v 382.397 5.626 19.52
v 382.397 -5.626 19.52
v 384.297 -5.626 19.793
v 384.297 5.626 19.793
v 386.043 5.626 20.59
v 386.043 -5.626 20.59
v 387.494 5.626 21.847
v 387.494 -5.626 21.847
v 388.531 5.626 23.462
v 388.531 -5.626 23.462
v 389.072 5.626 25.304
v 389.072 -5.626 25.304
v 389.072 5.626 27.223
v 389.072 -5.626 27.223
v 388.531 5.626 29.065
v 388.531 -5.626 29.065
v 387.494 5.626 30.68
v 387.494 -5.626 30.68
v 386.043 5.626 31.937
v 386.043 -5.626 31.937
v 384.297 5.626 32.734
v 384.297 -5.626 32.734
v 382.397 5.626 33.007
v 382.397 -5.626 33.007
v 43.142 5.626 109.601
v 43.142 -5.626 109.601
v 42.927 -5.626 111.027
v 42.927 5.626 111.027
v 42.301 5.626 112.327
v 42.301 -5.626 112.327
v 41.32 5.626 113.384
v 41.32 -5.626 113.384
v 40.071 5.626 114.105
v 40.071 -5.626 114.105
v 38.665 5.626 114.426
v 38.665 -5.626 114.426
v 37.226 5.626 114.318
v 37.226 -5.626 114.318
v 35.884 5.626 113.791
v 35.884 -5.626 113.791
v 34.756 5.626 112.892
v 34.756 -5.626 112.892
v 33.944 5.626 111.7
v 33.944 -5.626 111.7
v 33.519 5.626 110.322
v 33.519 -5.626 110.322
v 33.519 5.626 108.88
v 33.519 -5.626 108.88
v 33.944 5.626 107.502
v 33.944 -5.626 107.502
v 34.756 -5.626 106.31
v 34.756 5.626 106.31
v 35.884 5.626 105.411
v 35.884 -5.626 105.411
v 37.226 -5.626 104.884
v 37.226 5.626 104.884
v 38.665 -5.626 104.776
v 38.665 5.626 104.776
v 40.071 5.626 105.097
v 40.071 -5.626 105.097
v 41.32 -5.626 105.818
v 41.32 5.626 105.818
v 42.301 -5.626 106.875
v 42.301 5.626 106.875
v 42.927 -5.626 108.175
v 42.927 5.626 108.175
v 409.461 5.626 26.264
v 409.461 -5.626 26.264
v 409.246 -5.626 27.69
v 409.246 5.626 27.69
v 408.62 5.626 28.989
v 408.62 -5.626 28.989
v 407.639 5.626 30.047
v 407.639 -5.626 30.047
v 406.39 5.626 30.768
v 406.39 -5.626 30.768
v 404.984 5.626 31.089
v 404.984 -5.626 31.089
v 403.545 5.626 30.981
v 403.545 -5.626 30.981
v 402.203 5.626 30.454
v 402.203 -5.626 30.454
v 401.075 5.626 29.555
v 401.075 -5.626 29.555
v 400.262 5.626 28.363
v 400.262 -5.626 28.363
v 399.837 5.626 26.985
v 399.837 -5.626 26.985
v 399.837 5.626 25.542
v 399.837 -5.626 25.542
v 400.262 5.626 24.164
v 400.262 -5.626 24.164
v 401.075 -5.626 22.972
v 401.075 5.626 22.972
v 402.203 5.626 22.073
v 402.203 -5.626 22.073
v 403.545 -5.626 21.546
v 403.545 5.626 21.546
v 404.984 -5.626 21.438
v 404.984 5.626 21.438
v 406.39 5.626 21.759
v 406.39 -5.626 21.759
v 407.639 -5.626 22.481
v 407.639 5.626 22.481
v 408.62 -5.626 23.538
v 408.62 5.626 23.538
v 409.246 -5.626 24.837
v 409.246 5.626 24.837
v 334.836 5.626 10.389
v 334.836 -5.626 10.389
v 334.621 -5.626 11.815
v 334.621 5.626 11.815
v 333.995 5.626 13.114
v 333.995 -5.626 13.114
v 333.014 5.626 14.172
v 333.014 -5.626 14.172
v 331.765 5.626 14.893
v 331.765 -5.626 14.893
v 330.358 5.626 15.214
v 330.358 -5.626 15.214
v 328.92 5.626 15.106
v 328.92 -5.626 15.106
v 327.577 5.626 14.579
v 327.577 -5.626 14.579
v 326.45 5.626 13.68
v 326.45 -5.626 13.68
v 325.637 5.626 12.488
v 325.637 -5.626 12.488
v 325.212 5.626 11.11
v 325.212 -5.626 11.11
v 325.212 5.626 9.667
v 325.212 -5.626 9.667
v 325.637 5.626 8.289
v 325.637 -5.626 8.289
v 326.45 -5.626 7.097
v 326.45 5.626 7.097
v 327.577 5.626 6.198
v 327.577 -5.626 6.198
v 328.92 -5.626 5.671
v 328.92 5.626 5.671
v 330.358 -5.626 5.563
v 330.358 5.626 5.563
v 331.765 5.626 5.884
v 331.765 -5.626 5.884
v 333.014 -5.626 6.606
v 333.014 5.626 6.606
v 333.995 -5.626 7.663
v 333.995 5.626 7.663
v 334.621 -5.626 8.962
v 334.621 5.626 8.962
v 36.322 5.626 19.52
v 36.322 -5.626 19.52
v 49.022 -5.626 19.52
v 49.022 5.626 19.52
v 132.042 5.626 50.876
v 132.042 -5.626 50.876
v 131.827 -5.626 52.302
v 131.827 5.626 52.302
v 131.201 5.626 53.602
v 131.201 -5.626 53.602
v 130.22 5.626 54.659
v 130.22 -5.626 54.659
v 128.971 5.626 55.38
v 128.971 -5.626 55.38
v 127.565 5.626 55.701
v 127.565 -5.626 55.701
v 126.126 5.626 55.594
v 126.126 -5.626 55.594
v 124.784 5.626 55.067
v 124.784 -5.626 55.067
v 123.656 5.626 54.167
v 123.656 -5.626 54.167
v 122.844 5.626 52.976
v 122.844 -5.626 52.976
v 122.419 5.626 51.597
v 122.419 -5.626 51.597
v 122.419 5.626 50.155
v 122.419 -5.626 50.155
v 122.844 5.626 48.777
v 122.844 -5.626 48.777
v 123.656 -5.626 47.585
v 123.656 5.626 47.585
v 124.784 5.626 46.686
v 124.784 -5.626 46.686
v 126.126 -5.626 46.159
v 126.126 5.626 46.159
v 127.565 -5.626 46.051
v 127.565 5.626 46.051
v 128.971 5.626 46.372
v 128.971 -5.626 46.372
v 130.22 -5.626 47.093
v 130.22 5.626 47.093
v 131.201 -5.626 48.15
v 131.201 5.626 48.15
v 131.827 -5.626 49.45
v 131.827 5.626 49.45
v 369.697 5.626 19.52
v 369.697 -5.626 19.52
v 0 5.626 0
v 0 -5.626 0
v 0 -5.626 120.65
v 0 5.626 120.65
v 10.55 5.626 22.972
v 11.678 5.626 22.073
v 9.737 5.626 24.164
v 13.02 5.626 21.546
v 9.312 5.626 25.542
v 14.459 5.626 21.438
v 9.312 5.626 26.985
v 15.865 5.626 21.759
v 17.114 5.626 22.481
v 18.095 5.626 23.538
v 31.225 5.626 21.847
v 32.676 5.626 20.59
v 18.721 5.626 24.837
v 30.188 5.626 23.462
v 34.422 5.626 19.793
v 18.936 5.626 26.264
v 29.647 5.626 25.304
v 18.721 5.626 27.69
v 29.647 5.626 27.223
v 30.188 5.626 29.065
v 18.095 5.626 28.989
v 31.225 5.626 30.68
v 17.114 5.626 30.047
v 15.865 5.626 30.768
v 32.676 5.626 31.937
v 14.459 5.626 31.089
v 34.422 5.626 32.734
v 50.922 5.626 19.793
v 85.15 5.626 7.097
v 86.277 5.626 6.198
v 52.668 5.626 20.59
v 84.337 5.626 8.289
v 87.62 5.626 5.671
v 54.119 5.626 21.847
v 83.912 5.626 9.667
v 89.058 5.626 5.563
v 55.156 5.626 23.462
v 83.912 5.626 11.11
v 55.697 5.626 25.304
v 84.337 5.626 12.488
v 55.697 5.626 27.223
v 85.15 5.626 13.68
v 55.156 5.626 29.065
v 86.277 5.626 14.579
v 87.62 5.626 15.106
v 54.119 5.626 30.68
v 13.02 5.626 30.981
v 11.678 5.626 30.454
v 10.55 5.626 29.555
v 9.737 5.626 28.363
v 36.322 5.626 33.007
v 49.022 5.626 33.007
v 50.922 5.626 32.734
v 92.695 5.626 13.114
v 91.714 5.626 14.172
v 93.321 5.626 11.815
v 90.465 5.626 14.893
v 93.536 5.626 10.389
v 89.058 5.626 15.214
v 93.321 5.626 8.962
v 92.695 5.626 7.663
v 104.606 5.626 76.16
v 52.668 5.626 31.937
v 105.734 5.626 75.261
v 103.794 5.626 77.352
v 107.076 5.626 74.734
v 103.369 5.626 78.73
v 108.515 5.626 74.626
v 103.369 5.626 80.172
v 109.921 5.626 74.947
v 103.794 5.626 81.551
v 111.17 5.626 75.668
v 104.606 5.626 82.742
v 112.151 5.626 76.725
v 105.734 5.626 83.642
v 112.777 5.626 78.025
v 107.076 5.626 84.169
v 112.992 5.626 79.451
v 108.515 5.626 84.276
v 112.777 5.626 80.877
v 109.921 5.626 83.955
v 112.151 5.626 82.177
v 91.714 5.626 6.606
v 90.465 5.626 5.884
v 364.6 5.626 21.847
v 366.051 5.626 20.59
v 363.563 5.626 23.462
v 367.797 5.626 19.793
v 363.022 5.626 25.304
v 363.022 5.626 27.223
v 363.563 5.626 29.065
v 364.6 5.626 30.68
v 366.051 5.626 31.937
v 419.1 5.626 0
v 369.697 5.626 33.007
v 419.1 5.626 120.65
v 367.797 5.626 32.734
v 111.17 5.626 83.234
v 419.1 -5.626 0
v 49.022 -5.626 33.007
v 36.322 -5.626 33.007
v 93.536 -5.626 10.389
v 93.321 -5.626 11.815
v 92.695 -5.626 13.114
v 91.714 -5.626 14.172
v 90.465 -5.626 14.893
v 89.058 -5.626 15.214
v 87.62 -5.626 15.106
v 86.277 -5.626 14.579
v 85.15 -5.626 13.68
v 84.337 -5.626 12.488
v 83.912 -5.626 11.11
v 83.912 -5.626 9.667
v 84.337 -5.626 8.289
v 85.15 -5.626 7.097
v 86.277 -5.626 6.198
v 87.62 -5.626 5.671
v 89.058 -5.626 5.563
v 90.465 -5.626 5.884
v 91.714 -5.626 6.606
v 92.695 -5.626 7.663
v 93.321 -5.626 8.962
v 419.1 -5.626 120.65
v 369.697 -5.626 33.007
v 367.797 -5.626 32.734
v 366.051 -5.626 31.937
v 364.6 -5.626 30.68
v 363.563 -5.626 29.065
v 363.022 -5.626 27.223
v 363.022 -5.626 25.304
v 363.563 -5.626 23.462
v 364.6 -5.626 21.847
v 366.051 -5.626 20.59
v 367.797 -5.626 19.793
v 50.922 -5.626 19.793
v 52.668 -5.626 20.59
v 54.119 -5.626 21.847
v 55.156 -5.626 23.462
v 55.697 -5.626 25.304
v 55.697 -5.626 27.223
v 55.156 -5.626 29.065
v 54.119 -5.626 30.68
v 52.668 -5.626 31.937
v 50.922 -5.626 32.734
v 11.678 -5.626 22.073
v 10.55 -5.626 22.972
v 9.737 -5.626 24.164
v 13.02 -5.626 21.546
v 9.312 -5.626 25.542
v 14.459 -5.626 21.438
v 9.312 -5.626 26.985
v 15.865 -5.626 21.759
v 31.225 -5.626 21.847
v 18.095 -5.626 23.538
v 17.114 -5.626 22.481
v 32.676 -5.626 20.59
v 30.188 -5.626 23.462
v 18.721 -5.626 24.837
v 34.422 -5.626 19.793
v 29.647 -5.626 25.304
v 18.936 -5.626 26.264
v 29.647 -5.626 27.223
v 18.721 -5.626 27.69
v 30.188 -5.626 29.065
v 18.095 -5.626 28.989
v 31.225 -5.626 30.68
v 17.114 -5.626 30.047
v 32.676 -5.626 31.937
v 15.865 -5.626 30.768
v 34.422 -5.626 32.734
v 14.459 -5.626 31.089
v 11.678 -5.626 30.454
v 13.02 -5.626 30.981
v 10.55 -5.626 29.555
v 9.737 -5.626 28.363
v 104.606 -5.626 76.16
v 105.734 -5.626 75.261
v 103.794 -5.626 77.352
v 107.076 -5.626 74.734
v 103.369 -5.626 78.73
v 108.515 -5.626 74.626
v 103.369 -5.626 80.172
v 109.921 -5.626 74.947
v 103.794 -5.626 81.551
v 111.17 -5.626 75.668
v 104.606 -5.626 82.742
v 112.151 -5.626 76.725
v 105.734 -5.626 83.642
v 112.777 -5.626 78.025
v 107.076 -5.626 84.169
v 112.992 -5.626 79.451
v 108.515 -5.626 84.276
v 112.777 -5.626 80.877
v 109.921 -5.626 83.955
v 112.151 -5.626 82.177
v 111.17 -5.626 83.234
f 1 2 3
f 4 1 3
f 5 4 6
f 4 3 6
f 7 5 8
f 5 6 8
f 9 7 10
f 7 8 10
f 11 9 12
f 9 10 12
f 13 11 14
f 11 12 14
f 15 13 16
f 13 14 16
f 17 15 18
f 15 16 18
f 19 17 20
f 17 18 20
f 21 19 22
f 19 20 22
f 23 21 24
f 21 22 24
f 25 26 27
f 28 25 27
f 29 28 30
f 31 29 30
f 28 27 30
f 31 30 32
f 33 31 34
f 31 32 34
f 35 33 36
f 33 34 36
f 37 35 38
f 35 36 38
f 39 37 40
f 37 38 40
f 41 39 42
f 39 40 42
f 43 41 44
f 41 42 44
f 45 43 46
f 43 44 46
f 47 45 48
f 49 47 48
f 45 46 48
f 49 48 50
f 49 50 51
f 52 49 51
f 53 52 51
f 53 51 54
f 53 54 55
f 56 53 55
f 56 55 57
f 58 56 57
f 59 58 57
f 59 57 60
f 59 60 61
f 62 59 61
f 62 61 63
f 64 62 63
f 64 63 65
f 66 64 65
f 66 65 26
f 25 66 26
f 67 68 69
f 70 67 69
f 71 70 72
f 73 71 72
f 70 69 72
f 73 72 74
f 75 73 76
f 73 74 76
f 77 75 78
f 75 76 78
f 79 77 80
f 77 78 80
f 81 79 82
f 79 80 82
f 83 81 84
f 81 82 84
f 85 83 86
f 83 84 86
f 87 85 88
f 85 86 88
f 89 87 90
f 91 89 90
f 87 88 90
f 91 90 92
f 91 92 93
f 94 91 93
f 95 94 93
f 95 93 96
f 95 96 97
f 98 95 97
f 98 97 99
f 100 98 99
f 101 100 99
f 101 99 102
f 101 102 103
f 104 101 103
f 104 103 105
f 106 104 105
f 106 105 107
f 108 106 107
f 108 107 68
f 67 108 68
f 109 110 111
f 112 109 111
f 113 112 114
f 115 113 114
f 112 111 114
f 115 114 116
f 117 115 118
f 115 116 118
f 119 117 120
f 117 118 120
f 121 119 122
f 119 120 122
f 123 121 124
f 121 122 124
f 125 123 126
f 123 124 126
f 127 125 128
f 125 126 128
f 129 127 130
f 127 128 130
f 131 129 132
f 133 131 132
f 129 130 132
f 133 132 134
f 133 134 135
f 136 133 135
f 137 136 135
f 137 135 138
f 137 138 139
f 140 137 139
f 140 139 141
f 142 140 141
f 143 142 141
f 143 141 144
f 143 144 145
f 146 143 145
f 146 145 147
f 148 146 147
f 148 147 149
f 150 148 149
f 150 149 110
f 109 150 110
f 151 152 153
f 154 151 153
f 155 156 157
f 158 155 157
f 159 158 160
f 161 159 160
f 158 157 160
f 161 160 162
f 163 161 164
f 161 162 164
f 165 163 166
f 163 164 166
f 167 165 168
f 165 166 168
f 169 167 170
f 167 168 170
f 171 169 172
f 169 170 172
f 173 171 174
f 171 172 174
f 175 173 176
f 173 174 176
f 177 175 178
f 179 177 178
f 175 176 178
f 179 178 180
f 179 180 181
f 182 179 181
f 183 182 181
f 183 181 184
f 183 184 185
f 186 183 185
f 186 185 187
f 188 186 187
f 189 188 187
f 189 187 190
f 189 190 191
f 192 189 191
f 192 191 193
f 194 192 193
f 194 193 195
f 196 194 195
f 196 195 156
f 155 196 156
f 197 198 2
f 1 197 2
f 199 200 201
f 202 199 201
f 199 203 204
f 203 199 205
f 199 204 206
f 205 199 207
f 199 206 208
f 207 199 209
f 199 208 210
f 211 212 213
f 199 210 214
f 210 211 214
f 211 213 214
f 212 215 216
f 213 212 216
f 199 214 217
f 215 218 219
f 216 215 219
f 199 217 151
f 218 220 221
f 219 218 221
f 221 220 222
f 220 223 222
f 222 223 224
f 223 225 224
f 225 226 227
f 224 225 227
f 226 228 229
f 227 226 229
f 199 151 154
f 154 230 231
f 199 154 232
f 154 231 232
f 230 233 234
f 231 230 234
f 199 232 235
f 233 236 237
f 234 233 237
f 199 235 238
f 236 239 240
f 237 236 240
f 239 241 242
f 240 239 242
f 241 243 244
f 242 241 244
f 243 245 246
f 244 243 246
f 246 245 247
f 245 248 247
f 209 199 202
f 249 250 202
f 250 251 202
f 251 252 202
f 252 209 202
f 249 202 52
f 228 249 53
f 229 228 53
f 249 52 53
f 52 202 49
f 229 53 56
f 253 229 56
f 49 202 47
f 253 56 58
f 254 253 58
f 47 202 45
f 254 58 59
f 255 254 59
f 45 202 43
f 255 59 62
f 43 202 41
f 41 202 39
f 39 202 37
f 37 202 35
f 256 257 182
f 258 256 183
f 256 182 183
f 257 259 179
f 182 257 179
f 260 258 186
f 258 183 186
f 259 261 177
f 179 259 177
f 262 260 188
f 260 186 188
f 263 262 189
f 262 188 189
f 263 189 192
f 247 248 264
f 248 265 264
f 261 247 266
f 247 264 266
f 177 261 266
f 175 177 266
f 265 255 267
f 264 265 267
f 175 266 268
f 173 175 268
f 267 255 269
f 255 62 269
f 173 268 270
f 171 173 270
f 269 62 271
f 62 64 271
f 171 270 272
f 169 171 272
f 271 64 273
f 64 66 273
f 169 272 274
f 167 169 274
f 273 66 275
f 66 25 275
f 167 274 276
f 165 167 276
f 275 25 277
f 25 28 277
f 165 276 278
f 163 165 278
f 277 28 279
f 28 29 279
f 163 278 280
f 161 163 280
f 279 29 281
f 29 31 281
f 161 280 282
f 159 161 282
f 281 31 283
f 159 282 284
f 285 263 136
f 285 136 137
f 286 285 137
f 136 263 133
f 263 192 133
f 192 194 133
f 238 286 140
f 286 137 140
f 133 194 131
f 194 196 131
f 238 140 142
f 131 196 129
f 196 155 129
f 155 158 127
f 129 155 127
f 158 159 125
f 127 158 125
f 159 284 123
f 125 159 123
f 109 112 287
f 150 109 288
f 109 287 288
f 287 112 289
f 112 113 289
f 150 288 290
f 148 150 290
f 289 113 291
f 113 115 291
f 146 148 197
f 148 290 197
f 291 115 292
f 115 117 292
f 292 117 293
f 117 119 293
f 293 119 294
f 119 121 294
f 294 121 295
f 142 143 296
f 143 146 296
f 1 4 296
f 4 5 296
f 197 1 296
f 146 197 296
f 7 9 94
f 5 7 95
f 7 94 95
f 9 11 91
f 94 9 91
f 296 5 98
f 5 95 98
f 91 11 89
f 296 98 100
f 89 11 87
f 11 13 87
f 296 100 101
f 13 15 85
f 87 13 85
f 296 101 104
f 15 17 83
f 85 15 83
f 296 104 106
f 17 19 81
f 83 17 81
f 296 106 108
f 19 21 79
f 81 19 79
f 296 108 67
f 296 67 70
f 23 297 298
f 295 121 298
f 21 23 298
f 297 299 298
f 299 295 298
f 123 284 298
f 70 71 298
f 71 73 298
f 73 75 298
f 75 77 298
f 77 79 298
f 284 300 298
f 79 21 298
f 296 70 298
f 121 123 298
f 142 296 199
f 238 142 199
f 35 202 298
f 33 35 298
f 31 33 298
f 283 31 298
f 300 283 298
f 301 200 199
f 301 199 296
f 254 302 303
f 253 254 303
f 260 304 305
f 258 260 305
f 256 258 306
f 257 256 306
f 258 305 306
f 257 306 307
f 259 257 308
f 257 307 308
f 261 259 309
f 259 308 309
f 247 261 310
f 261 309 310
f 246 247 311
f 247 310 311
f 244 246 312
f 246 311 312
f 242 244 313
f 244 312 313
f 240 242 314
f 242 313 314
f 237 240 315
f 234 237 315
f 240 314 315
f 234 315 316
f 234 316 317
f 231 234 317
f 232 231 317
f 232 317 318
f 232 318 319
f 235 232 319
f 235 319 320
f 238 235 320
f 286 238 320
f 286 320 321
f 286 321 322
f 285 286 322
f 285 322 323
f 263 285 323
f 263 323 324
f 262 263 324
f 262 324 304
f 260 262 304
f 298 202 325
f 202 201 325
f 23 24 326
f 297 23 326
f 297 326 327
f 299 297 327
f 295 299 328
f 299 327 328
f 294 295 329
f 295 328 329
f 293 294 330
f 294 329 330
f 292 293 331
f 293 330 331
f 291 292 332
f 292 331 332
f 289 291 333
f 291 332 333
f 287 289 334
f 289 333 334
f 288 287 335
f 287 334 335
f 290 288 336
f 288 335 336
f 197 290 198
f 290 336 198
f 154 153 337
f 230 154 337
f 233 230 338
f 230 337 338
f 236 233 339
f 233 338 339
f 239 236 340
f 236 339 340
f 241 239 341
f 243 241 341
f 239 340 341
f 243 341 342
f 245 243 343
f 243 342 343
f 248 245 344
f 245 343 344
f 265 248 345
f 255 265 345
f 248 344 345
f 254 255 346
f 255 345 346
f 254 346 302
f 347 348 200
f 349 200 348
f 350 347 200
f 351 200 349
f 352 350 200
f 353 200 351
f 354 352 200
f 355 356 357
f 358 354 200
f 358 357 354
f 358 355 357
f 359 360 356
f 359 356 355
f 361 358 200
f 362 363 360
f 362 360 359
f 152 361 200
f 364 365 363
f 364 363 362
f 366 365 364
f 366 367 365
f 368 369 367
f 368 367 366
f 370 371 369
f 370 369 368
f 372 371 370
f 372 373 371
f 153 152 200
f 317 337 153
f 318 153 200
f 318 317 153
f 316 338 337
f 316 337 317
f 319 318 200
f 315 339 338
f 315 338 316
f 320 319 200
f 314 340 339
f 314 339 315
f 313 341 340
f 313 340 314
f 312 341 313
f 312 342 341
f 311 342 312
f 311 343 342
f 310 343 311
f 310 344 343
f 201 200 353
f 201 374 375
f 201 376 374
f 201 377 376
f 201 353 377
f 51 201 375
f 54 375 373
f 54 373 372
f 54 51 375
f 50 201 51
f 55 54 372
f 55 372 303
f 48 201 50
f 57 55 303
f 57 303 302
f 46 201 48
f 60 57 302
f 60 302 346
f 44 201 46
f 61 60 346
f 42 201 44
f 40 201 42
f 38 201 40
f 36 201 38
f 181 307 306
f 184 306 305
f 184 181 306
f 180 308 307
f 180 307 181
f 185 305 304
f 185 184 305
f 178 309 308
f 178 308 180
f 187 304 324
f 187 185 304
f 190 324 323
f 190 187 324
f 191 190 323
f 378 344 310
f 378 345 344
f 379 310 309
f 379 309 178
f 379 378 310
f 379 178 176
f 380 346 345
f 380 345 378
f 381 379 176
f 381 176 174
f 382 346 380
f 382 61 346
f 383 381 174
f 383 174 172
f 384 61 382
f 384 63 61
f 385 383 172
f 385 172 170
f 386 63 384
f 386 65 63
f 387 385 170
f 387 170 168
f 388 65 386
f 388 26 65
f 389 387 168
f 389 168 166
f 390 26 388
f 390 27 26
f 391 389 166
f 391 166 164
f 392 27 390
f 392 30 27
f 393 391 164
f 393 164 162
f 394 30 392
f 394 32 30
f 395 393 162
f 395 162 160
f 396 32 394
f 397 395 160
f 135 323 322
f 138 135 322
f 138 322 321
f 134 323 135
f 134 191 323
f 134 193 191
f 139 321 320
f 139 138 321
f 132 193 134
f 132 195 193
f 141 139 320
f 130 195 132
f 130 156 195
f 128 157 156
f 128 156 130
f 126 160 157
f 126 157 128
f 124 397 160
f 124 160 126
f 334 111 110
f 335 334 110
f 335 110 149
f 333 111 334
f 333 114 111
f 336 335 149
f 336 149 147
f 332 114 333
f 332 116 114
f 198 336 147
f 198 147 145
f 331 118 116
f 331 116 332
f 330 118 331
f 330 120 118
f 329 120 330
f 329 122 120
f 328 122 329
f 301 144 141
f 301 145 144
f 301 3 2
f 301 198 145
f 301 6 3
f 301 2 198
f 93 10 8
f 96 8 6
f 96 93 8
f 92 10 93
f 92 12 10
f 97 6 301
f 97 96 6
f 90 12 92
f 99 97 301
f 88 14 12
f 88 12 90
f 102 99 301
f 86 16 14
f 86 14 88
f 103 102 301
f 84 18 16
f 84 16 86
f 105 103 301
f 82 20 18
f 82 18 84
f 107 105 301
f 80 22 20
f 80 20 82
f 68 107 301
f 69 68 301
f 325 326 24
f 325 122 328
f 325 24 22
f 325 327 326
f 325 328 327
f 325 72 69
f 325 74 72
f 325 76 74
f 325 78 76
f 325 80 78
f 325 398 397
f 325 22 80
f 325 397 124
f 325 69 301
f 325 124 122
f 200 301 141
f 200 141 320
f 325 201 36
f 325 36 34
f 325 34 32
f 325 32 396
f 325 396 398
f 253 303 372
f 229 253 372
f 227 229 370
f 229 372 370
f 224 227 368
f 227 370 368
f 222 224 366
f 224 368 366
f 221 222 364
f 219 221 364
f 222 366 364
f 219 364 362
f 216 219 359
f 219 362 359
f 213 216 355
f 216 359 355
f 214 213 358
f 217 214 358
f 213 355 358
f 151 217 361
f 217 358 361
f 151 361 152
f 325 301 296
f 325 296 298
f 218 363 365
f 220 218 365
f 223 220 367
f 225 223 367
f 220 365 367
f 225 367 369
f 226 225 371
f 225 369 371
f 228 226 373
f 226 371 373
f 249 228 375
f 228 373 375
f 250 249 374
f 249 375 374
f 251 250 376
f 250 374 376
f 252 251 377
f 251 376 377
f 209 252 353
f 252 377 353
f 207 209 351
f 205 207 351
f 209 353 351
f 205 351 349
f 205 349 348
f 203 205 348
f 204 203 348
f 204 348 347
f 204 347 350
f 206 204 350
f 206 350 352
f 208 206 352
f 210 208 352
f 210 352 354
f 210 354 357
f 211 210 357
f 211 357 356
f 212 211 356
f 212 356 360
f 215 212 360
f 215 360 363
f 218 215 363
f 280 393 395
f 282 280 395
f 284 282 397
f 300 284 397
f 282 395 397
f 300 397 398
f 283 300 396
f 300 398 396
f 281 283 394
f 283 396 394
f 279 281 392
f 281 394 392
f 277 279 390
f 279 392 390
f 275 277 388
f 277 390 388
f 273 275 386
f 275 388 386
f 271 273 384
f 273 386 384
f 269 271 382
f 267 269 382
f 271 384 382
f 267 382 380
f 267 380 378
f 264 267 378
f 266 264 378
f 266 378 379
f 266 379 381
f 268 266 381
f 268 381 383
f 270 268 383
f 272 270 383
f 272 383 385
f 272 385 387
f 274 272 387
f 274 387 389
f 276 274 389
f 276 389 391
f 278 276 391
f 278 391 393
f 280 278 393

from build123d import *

# Parameters (mm, degrees)
F0_W     = 419.1
F0_H     = 120.65
F1_DEPTH = 5.6261
F2_R     = 4.8387
F3_DEPTH = 11.2532
F5_DEPTH = 11.2532


with BuildPart() as f1:
    # F0 (on Front) → F1 (new body, symmetric)
    with BuildSketch(Plane.XZ):
        with Locations((209.55, 60.325)):
            Rectangle(F0_W, F0_H)
    extrude(amount=F1_DEPTH, both=True)

    # F2 (on face) → F3 (cut, through all)
    with BuildSketch(Plane.XZ.offset(5.6261)):
        with Locations((14.097, 26.2636)):
            Circle(F2_R)
        with Locations((38.3032, 109.601)):
            Circle(F2_R)
        with Locations((108.1532, 79.4512)):
            Circle(F2_R)
        with Locations((329.9968, 10.3886)):
            Circle(F2_R)
        with Locations((88.6968, 10.3886)):
            Circle(F2_R)
        with Locations((127.2032, 50.8762)):
            Circle(F2_R)
        with Locations((404.622, 26.2636)):
            Circle(F2_R)
    extrude(amount=-F3_DEPTH, mode=Mode.SUBTRACT)

    # F4 (on face) → F5 (cut, through all)
    with BuildSketch(Plane.XZ.offset(5.6261)):
        with BuildLine():
            Line((49.022, 33.0073), (36.322, 33.0073))
            ThreePointArc((36.322, 33.0073), (29.5783, 26.2636), (36.322, 19.5199))
            Line((36.322, 19.5199), (49.022, 19.5199))
            ThreePointArc((49.022, 19.5199), (55.7657, 26.2636), (49.022, 33.0073))
        make_face()
        with BuildLine():
            Line((382.397, 33.0073), (369.697, 33.0073))
            ThreePointArc((369.697, 33.0073), (362.9533, 26.2636), (369.697, 19.5199))
            Line((369.697, 19.5199), (382.397, 19.5199))
            ThreePointArc((382.397, 19.5199), (389.1407, 26.2636), (382.397, 33.0073))
        make_face()
    extrude(amount=-F5_DEPTH, mode=Mode.SUBTRACT)


solid = f1.part
